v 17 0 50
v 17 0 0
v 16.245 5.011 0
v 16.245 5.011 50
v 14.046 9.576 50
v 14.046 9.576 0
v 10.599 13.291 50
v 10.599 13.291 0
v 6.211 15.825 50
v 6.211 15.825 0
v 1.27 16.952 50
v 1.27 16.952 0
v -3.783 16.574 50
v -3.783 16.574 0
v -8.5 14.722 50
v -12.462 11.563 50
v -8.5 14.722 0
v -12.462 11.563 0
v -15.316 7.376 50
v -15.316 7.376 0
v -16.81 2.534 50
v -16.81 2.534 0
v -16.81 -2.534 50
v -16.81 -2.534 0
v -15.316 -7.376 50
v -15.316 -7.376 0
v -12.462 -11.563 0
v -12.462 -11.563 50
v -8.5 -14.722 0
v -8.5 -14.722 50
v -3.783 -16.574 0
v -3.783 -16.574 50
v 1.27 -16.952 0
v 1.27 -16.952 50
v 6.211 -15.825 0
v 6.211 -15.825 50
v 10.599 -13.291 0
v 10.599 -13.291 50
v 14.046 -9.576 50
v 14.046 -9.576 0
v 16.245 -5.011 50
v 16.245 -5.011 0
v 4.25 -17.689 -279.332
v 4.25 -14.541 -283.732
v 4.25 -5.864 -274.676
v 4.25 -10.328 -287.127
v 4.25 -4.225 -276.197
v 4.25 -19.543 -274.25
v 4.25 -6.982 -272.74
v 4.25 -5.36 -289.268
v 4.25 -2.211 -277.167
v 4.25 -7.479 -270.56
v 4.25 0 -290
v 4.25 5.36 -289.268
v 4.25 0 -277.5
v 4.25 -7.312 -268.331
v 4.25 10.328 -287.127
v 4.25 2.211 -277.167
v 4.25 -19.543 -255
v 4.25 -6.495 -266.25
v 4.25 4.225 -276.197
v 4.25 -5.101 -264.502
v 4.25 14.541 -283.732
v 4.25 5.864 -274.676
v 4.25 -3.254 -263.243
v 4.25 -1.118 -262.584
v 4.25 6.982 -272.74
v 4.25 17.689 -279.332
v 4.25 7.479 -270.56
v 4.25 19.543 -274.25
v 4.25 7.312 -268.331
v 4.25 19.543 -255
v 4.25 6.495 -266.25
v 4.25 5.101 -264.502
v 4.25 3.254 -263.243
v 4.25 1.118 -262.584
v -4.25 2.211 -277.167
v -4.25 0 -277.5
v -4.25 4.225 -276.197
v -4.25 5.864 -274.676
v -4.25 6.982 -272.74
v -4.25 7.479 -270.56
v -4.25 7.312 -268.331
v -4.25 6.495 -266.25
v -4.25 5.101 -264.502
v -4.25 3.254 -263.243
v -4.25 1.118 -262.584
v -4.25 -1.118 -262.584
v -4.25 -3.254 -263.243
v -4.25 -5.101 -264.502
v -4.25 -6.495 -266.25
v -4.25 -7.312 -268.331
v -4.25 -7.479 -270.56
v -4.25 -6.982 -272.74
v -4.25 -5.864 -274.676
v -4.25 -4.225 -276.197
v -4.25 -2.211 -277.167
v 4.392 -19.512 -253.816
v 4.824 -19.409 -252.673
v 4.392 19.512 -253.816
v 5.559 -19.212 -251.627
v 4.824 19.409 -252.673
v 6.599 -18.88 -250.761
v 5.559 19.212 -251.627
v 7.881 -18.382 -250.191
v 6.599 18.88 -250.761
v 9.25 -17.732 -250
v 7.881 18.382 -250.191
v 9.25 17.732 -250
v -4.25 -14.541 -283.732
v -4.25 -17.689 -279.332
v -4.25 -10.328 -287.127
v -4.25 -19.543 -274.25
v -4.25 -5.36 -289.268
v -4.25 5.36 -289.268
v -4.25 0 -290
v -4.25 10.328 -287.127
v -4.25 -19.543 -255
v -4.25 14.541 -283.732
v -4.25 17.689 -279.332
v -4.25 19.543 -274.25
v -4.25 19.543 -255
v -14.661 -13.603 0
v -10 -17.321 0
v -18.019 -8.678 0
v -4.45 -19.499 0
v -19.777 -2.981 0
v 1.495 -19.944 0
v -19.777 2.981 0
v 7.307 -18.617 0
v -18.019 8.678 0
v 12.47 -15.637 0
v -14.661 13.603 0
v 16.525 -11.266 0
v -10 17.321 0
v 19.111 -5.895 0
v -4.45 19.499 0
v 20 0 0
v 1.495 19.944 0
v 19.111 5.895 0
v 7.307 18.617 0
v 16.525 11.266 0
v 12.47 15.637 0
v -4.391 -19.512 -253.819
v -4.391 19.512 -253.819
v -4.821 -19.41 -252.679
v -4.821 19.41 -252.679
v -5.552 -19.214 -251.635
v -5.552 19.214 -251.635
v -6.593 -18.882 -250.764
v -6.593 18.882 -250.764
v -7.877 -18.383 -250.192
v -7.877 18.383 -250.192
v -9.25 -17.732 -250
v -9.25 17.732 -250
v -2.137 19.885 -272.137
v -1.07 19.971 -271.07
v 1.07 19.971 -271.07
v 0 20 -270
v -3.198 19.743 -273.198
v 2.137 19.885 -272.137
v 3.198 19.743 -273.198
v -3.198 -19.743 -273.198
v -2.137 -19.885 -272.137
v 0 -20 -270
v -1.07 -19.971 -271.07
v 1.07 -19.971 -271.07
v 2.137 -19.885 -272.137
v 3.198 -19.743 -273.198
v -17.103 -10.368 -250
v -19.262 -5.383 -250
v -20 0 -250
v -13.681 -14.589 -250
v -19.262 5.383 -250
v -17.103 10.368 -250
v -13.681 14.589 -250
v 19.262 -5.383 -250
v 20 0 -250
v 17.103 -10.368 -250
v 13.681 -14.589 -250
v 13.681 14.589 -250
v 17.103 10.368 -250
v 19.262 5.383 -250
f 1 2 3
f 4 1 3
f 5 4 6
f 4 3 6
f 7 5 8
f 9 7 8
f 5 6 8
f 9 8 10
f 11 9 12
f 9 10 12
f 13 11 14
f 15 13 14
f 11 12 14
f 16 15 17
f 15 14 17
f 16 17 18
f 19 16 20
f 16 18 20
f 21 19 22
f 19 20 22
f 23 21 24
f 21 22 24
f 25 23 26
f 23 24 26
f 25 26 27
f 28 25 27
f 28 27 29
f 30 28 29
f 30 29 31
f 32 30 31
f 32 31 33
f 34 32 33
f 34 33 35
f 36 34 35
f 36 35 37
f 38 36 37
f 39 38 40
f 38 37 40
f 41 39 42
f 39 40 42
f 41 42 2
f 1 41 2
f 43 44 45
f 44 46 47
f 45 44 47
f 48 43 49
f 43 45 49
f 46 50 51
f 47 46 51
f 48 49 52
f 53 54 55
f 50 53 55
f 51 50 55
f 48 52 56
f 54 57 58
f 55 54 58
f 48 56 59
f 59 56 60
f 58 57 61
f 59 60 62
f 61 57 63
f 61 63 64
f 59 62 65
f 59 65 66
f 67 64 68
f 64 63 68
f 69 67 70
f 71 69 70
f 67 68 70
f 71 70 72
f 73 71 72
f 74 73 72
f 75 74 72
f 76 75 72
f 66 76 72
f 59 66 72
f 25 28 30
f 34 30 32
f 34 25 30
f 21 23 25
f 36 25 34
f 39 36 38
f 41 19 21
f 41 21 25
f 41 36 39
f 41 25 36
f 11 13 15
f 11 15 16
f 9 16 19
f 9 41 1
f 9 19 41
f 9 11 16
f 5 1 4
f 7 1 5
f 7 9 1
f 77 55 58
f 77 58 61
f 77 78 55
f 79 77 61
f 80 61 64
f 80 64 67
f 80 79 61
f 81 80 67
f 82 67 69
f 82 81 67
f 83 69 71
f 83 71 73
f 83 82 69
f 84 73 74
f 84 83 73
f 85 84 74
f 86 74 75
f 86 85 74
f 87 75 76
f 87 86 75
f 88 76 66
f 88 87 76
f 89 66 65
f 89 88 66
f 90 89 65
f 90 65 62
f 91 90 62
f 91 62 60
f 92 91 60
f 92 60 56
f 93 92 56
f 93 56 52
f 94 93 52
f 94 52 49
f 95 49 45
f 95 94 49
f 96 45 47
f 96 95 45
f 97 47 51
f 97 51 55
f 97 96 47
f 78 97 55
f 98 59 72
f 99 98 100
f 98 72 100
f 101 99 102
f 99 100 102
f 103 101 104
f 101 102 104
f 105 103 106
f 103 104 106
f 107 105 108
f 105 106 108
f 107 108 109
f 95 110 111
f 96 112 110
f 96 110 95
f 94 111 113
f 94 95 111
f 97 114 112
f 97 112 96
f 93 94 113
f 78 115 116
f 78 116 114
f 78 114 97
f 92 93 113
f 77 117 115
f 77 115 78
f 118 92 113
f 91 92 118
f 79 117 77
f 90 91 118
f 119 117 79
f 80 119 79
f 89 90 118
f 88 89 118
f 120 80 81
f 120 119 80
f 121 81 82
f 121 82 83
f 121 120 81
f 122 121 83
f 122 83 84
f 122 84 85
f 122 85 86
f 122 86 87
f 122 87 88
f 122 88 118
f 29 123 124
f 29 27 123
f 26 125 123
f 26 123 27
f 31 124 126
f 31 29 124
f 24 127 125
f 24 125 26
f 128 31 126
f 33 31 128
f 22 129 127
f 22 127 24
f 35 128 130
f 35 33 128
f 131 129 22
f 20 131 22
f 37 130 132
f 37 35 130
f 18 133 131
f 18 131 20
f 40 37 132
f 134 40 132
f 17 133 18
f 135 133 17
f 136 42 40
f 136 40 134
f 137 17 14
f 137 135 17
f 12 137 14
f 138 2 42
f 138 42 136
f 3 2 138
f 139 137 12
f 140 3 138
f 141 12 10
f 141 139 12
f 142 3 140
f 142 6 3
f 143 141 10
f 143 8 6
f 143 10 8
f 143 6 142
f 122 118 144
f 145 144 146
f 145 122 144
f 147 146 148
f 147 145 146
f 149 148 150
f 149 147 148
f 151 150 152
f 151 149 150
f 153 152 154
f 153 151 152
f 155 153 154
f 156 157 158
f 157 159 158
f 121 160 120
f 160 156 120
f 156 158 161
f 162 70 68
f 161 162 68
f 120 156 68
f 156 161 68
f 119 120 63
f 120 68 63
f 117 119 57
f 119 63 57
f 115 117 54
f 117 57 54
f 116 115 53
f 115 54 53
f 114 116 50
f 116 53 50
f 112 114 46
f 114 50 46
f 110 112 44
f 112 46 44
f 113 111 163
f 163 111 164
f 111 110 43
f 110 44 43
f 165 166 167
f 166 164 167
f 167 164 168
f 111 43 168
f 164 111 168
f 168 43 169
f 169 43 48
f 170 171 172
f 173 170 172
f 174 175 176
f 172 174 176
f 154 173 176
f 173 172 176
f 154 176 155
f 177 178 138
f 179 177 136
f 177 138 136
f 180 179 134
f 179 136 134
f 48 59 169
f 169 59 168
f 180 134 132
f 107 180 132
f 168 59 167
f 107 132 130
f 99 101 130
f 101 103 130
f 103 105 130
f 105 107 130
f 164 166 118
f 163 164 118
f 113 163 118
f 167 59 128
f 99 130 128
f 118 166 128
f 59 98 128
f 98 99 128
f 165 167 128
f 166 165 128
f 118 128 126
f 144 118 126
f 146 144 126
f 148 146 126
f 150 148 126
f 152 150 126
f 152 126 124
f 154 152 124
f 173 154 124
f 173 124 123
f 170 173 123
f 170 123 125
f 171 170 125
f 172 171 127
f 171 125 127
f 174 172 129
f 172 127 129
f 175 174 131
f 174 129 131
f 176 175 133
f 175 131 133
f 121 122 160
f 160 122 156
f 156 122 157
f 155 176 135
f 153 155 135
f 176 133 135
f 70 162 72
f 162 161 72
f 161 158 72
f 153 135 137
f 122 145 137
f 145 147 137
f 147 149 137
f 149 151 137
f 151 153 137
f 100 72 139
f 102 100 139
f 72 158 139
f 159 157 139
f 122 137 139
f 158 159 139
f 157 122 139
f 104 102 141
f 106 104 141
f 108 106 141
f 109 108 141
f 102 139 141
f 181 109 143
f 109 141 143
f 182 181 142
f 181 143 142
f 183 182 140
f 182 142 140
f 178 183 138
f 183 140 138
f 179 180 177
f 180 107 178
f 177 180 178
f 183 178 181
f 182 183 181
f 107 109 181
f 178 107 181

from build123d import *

# Parameters (mm, degrees)
SKETCH5_R               = 20
BOSS_EXTRUDE4_DEPTH     = 250
SKETCH6_R               = 17
BOSS_EXTRUDE5_DEPTH     = 50
SKETCH7_R               = 7.5
BOSS_EXTRUDE6_DEPTH     = 4.25
CUT_EXTRUDE1_DEPTH      = 302.330383466
CUT_EXTRUDE1_DEPTH_BACK = 302.330383466
SKETCH8_OUTSIDE_W       = 110.934
SKETCH8_OUTSIDE_H       = 110.934
SKETCH8_OUTSIDE_R       = 20
FILLET1_R               = 5


with BuildPart() as part:
    # Sketch5 → Boss-Extrude4 (new body)
    with BuildSketch(Plane.XY):
        Circle(SKETCH5_R)
    extrude(amount=-BOSS_EXTRUDE4_DEPTH)

    # Sketch6 → Boss-Extrude5 (add)
    with BuildSketch(Plane.XY):
        Circle(SKETCH6_R)
    extrude(amount=BOSS_EXTRUDE5_DEPTH)

    # Sketch7 → Boss-Extrude6 (add, symmetric)
    with BuildSketch(Plane(origin=(0, 0, 0), x_dir=(0, 0, -1), z_dir=(1, 0, 0))):
        with BuildLine():
            Line((250, 20), (270, 20))
            ThreePointArc((270, 20), (290, 0), (270, -20))
            Line((270, -20), (250, -20))
            Line((250, -20), (250, 20))
        make_face()
        with Locations((270, 0)):
            Circle(SKETCH7_R, mode=Mode.SUBTRACT)
    extrude(amount=BOSS_EXTRUDE6_DEPTH, both=True)

    # Sketch8 outside → Cut-Extrude1 (cut, two sides: drawn at the far end of the back side and taken through both)
    with BuildSketch(Plane(origin=(0, 0, -250), x_dir=(-1, 0, 0), z_dir=(0, 0, -1)).offset(-CUT_EXTRUDE1_DEPTH_BACK)):
        Rectangle(SKETCH8_OUTSIDE_W, SKETCH8_OUTSIDE_H)
        with Locations(Location((0, 0, 0), (0, 0, 180))):
            Circle(SKETCH8_OUTSIDE_R, mode=Mode.SUBTRACT)
    extrude(amount=CUT_EXTRUDE1_DEPTH + CUT_EXTRUDE1_DEPTH_BACK, mode=Mode.SUBTRACT)

    # Fillet1
    fillet1_edges = [part.edges().sort_by_distance(p)[0] for p in [
        (4.25, 0, -250),
        (-4.25, 0, -250),
    ]]
    fillet(fillet1_edges, radius=FILLET1_R)


solid = part.part
